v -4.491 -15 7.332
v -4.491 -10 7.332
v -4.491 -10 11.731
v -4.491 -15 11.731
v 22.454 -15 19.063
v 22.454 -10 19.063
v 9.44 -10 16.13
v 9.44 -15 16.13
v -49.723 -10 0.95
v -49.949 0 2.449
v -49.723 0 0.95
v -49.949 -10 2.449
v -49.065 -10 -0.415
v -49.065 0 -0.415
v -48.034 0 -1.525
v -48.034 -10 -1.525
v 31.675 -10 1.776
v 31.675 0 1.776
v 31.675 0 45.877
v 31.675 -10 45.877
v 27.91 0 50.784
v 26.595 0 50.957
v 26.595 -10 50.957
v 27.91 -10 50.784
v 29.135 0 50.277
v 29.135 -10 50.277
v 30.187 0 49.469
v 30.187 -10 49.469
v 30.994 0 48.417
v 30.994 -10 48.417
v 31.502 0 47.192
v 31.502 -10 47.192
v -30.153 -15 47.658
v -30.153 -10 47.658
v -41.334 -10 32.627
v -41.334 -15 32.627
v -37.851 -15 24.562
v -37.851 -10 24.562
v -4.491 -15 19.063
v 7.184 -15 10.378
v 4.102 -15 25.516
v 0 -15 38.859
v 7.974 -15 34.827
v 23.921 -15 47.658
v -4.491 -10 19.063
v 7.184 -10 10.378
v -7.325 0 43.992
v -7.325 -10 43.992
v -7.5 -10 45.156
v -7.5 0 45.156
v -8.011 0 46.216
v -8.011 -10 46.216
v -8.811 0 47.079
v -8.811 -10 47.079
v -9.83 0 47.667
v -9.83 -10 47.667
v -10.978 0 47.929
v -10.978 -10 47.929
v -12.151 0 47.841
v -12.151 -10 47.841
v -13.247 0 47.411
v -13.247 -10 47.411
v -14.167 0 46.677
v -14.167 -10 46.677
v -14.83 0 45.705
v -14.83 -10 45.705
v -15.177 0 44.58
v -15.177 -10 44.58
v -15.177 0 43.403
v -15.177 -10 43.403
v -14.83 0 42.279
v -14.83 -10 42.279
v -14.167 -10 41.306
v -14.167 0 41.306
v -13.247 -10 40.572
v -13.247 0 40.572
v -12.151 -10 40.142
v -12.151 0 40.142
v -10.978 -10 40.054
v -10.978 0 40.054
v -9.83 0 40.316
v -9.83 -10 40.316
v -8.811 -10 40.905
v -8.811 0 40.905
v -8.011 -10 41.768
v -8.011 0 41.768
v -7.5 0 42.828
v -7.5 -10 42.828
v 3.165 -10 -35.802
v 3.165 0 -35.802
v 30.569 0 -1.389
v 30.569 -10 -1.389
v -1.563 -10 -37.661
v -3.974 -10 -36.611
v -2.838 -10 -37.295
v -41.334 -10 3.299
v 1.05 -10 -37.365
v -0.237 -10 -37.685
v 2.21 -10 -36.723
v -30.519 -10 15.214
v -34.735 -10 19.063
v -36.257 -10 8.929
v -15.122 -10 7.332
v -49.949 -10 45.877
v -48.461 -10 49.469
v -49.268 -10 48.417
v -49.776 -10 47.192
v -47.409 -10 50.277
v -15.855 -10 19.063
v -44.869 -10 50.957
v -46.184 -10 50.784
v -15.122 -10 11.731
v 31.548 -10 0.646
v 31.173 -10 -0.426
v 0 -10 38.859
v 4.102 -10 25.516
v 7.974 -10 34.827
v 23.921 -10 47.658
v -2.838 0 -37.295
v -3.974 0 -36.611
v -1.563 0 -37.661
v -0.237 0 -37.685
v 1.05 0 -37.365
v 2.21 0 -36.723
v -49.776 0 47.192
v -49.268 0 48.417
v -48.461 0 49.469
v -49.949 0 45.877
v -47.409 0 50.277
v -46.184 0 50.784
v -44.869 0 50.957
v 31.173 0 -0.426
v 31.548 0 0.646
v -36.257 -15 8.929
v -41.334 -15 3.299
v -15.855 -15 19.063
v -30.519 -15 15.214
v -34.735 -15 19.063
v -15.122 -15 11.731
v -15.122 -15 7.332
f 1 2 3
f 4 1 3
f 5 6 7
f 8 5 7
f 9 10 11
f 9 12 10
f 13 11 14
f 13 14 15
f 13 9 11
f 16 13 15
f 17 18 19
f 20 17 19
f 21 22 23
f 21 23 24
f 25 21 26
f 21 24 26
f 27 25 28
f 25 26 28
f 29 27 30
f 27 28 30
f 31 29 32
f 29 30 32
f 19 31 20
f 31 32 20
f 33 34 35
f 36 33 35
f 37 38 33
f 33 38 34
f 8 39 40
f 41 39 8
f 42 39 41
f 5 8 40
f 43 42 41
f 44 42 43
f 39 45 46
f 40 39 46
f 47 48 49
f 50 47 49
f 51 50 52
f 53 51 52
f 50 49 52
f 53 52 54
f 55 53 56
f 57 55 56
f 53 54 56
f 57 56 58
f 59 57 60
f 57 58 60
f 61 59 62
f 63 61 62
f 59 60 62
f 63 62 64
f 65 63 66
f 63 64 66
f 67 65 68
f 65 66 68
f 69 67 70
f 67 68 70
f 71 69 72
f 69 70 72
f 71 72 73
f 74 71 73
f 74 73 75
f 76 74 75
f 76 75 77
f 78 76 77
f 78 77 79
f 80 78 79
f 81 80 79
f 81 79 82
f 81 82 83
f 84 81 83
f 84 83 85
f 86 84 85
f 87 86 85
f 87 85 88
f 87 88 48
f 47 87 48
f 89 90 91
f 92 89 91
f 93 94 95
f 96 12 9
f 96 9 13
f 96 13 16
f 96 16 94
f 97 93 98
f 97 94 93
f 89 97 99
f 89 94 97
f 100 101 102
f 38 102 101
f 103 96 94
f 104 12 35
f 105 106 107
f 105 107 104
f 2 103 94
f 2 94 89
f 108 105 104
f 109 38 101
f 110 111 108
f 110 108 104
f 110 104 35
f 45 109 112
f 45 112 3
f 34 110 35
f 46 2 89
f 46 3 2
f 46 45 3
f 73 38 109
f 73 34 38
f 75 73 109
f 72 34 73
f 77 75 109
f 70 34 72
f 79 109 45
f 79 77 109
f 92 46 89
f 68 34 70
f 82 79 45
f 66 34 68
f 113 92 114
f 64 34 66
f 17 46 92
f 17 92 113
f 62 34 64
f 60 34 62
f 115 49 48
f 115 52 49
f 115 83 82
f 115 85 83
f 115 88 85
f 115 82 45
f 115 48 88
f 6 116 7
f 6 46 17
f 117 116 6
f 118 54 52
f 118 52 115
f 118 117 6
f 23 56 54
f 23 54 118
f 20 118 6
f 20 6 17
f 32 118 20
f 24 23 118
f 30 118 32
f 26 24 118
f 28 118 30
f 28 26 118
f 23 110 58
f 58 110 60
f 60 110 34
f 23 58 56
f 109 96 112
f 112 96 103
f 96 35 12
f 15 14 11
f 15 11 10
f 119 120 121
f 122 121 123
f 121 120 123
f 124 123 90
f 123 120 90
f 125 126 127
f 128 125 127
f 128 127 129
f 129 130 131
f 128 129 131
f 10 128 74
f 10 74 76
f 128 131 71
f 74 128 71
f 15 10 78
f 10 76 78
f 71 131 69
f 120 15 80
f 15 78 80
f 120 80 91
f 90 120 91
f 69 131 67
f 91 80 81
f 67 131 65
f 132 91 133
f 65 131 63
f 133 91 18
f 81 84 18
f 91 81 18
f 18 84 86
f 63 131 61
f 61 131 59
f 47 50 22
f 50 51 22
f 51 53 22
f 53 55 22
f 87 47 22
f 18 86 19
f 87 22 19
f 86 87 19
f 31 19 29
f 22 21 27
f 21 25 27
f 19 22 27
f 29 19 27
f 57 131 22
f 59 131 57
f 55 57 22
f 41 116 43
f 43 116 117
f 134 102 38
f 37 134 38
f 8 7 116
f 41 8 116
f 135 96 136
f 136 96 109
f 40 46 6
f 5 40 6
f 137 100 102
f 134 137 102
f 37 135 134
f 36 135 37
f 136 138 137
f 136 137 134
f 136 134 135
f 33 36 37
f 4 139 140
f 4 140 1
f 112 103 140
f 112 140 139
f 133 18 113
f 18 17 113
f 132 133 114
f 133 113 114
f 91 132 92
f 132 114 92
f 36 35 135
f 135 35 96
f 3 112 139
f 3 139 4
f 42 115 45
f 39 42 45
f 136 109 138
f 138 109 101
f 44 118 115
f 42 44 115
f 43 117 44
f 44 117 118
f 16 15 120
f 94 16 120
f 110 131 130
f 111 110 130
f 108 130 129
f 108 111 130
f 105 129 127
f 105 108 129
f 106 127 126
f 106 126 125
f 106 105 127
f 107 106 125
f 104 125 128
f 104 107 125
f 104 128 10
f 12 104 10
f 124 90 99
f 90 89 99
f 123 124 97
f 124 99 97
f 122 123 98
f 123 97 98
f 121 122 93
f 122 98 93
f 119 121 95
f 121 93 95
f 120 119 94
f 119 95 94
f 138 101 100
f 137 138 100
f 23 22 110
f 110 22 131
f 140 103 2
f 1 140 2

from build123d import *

# Parameters (mm, degrees)
F1_DEPTH = 10
F2_W     = 10.631341
F2_H     = 4.399176
F3_DEPTH = 5
F4_R     = 3.948378
F5_DEPTH = 101.092
F6_R     = 5.08


with BuildPart() as f1:
    # F0 (on Front) → F1 (new body)
    with BuildSketch(Plane.XZ):
        Polygon((31.674738, 50.957117), (-49.948968, 50.957117), (-49.948968, 0), (0, -39.775878), (31.674738, 0), align=None)
    extrude(amount=F1_DEPTH)

    # F2 (on face) → F3 (join)
    with BuildSketch(Plane.XZ.offset(10)):
        Polygon((-37.851237, 24.562063), (-30.15268, 47.657736), (-41.333918, 32.627217), (-41.333918, 3.299381), (-15.855361, 19.063093), (-34.735154, 19.063093), (-30.519279, 15.213814), (-36.257481, 8.929118), align=None)
        Polygon((7.973504, 34.826804), (23.920517, 47.657736), (0, 38.859382), (-4.490824, 19.063093), (7.183906, 10.378234), (22.454122, 19.063093), (9.439895, 16.13031), (4.101735, 25.516167), align=None)
        with Locations((-9.806494, 9.531547)):
            Rectangle(F2_W, F2_H)
    extrude(amount=F3_DEPTH)

    # F4 (on face) → F5 (cut)
    with BuildSketch(Plane.XZ.offset(10)):
        with Locations((-11.272887, 43.991752)):
            Circle(F4_R)
    extrude(amount=-F5_DEPTH, mode=Mode.SUBTRACT)

    # F6
    f6_edges = [f1.edges().sort_by_distance(p)[0] for p in [
        (-49.948968, -5, 50.957117),
        (31.674738, -5, 50.957117),
        (31.674738, -5, 0),
        (0, -5, -39.775878),
        (-49.948968, -5, 0),
    ]]
    fillet(f6_edges, radius=F6_R)


solid = f1.part
